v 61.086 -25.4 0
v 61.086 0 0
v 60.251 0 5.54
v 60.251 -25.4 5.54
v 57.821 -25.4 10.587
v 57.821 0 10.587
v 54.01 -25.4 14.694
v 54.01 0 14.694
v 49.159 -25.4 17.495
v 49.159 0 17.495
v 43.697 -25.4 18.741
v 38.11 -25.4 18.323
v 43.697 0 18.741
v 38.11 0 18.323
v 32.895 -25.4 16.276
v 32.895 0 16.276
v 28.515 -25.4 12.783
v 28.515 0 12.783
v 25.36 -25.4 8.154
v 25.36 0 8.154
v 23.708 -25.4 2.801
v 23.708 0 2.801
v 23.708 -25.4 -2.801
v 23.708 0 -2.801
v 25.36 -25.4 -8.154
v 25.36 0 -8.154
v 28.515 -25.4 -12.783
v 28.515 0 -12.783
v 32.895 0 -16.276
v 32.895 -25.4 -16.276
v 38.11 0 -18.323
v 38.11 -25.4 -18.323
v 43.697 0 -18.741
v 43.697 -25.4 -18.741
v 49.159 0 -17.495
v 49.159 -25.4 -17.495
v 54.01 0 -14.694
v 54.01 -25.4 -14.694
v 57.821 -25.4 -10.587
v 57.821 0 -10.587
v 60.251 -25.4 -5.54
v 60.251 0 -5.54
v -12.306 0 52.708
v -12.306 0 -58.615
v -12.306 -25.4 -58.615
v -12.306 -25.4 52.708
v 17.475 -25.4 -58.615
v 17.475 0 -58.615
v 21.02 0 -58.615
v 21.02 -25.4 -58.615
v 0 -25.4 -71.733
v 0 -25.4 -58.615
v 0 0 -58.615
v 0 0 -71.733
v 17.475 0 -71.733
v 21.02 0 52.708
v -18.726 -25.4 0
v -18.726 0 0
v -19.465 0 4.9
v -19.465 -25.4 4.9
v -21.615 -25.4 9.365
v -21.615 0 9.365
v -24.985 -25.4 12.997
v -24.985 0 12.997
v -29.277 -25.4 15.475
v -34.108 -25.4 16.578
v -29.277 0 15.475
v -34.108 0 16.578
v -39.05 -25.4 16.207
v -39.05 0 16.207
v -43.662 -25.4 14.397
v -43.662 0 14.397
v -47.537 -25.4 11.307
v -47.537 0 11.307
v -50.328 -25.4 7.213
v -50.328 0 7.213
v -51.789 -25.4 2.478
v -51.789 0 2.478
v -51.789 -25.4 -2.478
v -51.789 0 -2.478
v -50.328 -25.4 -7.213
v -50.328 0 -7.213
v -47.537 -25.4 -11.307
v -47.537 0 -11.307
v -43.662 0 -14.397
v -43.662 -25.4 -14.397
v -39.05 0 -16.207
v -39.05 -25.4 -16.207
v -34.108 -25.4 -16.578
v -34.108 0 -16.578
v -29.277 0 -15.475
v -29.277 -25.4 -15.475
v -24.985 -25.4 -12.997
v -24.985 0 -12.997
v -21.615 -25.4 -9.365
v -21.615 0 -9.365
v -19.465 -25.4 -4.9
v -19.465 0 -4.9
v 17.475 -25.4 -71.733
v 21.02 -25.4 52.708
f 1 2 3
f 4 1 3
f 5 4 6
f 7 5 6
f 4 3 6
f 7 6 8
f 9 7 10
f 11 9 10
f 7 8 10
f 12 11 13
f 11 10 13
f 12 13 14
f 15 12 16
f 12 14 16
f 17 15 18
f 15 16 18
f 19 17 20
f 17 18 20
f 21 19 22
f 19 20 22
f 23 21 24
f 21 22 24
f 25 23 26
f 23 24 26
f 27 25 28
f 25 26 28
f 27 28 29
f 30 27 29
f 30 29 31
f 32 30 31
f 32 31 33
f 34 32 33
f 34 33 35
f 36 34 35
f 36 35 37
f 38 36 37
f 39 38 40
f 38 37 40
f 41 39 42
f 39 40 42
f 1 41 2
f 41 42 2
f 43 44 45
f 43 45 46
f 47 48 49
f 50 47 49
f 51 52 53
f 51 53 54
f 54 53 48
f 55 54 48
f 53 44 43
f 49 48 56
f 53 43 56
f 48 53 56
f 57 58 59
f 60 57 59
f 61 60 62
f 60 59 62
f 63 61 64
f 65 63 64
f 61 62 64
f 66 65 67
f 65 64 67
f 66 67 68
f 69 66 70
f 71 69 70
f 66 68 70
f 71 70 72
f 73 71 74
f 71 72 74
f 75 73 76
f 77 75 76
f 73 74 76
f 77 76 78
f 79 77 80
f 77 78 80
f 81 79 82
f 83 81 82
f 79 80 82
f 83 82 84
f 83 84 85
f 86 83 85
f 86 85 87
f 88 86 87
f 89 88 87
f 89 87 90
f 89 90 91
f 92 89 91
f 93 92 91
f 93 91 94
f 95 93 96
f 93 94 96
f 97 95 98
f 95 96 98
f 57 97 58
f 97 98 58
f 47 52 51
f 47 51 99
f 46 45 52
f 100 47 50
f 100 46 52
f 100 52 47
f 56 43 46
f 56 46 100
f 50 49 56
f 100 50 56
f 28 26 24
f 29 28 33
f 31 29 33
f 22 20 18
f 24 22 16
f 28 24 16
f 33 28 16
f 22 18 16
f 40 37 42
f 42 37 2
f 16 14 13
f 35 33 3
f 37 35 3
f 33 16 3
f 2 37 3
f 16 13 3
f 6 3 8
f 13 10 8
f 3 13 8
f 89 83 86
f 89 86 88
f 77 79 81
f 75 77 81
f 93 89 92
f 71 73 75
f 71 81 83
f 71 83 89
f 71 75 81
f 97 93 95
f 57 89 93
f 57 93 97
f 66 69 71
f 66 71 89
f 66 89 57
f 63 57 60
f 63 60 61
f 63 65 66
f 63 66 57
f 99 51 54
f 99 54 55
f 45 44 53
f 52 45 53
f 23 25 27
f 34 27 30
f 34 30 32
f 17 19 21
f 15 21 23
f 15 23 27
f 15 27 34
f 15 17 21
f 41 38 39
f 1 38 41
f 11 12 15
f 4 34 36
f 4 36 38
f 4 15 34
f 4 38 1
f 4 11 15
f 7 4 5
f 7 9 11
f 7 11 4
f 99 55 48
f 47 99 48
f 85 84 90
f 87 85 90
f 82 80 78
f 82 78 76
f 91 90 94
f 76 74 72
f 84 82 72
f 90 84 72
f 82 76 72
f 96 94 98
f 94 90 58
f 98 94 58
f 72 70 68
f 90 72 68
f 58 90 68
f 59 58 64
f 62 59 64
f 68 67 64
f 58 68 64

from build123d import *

# Parameters (mm, degrees)
F0_W     = 33.326064
F0_H     = 111.323253
F1_DEPTH = 25.4
F2_R     = 16.624166
F2_R_2   = 18.793996
F3_DEPTH = 25.4
F4_W     = 6.633144
F4_H     = 0.709068
F5_DEPTH = 25.4


with BuildPart() as f1:
    # F0 (on Front) → F1 (new body)
    with BuildSketch(Plane.XZ):
        with Locations((4.357367, -2.953269)):
            Rectangle(F0_W, F0_H)
    extrude(amount=F1_DEPTH)

    # F4 (on Front) → F5 (join)
    with BuildSketch(Plane.XZ):
        Polygon((17.475074, -2.598734), (0, -2.598734), (0, -56.842227), (0, -57.551295), (0, -71.732596), (17.475074, -71.732596), align=None)
        with Locations((-3.316572, -57.196761)):
            Rectangle(F4_W, F4_H)
    extrude(amount=F5_DEPTH)


with BuildPart() as f3:
    # F2 (on Front) → F3 (new body)
    with BuildSketch(Plane.XZ):
        with Locations((-35.350289, 0)):
            Circle(F2_R)
        with Locations((42.29236, 0)):
            Circle(F2_R_2)
    extrude(amount=F3_DEPTH)


solid = Compound([f1.part, f3.part])
